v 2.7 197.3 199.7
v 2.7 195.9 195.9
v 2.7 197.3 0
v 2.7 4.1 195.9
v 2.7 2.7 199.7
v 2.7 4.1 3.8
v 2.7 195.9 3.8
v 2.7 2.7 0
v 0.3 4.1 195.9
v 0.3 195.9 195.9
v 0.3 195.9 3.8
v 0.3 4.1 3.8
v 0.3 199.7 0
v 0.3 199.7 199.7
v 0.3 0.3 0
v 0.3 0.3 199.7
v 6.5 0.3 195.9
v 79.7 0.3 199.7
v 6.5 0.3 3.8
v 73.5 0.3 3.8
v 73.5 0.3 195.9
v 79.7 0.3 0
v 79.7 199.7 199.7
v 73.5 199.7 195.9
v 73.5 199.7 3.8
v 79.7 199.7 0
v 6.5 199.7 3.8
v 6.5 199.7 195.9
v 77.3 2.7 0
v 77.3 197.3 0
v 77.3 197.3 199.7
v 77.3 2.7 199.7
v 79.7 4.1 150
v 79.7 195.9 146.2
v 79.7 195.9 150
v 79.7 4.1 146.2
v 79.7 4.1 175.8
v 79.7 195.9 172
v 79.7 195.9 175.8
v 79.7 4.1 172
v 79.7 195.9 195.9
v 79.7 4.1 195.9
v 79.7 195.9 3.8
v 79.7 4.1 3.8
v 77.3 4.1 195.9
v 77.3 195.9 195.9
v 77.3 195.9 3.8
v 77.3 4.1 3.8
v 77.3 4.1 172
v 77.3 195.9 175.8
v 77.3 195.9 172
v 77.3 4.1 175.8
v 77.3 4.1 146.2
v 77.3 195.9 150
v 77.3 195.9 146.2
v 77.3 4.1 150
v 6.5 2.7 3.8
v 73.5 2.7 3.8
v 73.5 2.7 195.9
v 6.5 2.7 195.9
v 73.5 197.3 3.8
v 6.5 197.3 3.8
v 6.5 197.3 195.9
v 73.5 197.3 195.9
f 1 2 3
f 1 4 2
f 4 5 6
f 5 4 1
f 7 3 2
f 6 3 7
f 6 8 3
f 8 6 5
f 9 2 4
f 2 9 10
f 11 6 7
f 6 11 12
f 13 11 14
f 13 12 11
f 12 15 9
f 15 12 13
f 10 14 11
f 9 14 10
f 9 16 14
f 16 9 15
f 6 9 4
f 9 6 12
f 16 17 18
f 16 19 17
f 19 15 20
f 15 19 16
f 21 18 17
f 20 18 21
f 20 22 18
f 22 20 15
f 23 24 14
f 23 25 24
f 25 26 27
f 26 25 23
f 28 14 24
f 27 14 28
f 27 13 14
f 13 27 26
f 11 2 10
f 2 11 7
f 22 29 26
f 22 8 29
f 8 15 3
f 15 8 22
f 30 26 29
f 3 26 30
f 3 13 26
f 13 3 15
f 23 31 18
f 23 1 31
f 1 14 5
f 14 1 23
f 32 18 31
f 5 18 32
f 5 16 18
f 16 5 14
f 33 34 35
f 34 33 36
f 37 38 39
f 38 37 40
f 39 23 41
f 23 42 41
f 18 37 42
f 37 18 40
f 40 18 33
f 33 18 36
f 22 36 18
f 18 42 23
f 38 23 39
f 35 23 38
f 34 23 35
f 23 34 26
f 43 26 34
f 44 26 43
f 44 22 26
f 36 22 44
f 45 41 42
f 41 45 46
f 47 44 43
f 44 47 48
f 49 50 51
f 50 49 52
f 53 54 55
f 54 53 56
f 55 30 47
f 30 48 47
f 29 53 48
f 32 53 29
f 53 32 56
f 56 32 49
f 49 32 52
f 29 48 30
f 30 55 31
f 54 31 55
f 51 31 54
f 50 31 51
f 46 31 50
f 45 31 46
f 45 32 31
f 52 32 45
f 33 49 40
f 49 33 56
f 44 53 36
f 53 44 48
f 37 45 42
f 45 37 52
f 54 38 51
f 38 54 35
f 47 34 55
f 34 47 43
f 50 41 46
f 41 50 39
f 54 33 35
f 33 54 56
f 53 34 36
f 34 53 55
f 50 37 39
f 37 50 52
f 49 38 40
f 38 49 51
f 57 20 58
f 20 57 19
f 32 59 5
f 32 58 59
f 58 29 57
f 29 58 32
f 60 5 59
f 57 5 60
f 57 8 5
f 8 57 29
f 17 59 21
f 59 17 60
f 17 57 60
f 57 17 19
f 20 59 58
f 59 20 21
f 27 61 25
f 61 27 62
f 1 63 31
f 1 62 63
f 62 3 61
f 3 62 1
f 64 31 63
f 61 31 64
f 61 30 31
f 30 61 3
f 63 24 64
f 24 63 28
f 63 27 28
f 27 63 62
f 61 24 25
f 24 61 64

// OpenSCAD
//Variablen Menschen
ms = 1.27; //Skalierung des Mannes Größter = 190 cm

boxc_r = .7;
boxc_g = .5;
boxc_b = .5;
boxc_a = 1; //Sichtbarkeit, 1 = voll

//variablen Box
box_h = 200;
box_b = 200; //Breite der Box
box_t = 80; // Tiefe der Box
box_l = 0; //Lift, im Transportbetrieb

box_d = 0.3; //Dicke der Platten in mm


//variablen Geruest

//Farbe
gerc_r = .7;
gerc_g = .8;
gerc_b = .7;
gerc_a = 1; //Sichtbarkeit, 1 = voll


holz_b = 2.4; //Kantholz, 1 = voll
holz_l = 3.8;

//Variablen Monitor

monitor_b = 30;
monitor_h = 22;

monitor_z =150;

//Aufruf


geruest_vorne_hinten();
geruest_seiten();
//box();  //-Schraegstriche entfernen um box zu zeigen
//people_stand(); //-Schraegstriche entfernen um Menschen zu zeigen
//people_walk(); //-Schraegstriche entfernen um Menschen zu zeigen

module people_stand()
{
    difference()
	{
       	union()
        {   
            //Mann 1
            translate([90,0,-4])
            scale([ms,ms,ms])
            rotate([0,0,90])
            import("man_1.stl", convexity=3);
            //Mann 2
            translate([105,60,-4])
            scale([ms,ms,ms])
            rotate([0,0,90])
            import("man_3.stl", convexity=3);
            //Mann 3
            translate([60,60,-4])
            scale([ms,ms,ms])
            rotate([0,0,90])
            import("man_2.stl", convexity=3);
            //Mann 3
            translate([90,120,-4])
            scale([ms,ms,ms])
            rotate([0,0,90])
            import("man_2.stl", convexity=3);
        }
        
         union()
        {
            translate([0,0,-5])
            cube([200, 500, 5]);
        }
    }
}

module people_walk()
{
    difference()
	{
       	union()
        {   
            //Mann 1
            translate([0,0,-4])
            scale([ms,ms,ms])
            rotate([0,0,0])
            import("man_1.stl", convexity=3);
            //Mann 2
            translate([0,60,-4])
            scale([ms,ms,ms])
            rotate([0,0,0])
            import("man_3.stl", convexity=3);
            //Mann 3
            translate([0,120,-4])
            scale([ms,ms,ms])
            rotate([0,0,0])
            import("man_2.stl", convexity=3);
        }
        
         union()
        {
            translate([0,0,-5])
            cube([200, 500, 5]);
        }
    }
}


module geruest_vorne_hinten()
{
    difference()
	{
       	union()
        {
            //Hinterseite Box links hinten
            translate([box_d,box_d, holz_l])
            color([gerc_r, gerc_g, gerc_b, gerc_a])
            cube([holz_b,holz_l,box_h - box_d - holz_l * 2]);
            
            //Hinterseite Box rechts hinten
            translate([box_d,box_b - box_d - holz_l,holz_l])
            color([gerc_r, gerc_g, gerc_b, gerc_a])
            cube([holz_b,holz_l,box_h - box_d - holz_l * 2]);

            //Hinterseite Box unten
            translate([box_d,box_d, 0])
            color([gerc_r, gerc_g / 2, gerc_b, gerc_a])
            cube([holz_b, box_b - box_d * 2, holz_l]);
            
            //Hinterseite Box oben
            translate([box_d,box_d,box_h - box_d - holz_l])
            color([gerc_r, gerc_g / 2, gerc_b, gerc_a])
            cube([holz_b, box_b - box_d * 2, holz_l]);
            
            
            //Vorderseite Box links vorn
            translate([box_t - box_d - holz_b,box_d, holz_l])
            color([gerc_r, gerc_g, gerc_b, gerc_a])
            cube([holz_b,holz_l,box_h - box_d - holz_l * 2]);
            
            //Vorderseite Box rechts vorn
            translate([box_t - box_d - holz_b,box_b - box_d - holz_l, holz_l])
            color([gerc_r, gerc_g, gerc_b, gerc_a])
            cube([holz_b,holz_l,box_h - box_d - holz_l * 2]);
            
            //Vorderseite Box unten
            translate([box_t - box_d - holz_b, box_d, 0])
            color([gerc_r, gerc_g / 2, gerc_b, gerc_a])
            cube([holz_b, box_b - box_d * 2, holz_l]);

            //Vorderseite Box oben
            translate([box_t - box_d - holz_b, box_d ,box_h - box_d - holz_l])
            color([gerc_r, gerc_g / 2, gerc_b, gerc_a])
            cube([holz_b, box_b - box_d * 2, holz_l]);
            
            
            //Monitorstrebe unten
            translate([box_t - box_d - holz_b, box_d + holz_l, monitor_z - holz_l])
            color([gerc_r, gerc_g / 2, gerc_b, gerc_a])
            cube([holz_b, box_b - box_d * 2 - holz_l*2, holz_l]);
            
            //Monitorstrebe oben
            translate([box_t - box_d - holz_b, box_d + holz_l, monitor_z + monitor_h])
            color([gerc_r, gerc_g / 2, gerc_b, gerc_a])
            cube([holz_b, box_b - box_d * 2 - holz_l*2, holz_l]);
            
        }
        
         union()
        {
            //Elemente Minus
        }
    }
}


module geruest_seiten()
{
    difference()
	{
       	union()
        {
            //Linke Seite unten
            translate([box_d + holz_b,box_d,0])
            color([gerc_r/2, gerc_g, gerc_b, gerc_a])
            cube([box_t - box_d*2 - holz_b * 2 ,holz_b, holz_l]);
            
            //Linke Seite oben
            translate([box_d + holz_b,box_d,box_h - holz_l - box_d])
            color([gerc_r/2, gerc_g, gerc_b, gerc_a])
            cube([box_t - box_d*2 - holz_b * 2 ,holz_b, holz_l]);
            
            //linke Seiten hinten
            translate([box_d + holz_b,box_d, holz_l])
            color([gerc_r, gerc_g, gerc_b/2, gerc_a])
            cube([holz_l,holz_b,box_h - box_d - holz_l * 2]);

            //linke Seiten vorn
            translate([box_t - box_d - holz_l - holz_b ,box_d, holz_l])
            color([gerc_r, gerc_g, gerc_b/2, gerc_a])
            cube([holz_l,holz_b,box_h - box_d - holz_l * 2]);
            
            //rechte Seite unten
            translate([box_d + holz_b,box_b - holz_b - box_d,0])
            color([gerc_r/2, gerc_g, gerc_b, gerc_a])
            cube([box_t - box_d*2 - holz_b * 2 ,holz_b, holz_l]);
            
            //rechte Seite oben
            translate([box_d + holz_b,box_b - holz_b - box_d,box_h - holz_l - box_d])
            color([gerc_r/2, gerc_g, gerc_b, gerc_a])
            cube([box_t - box_d*2 - holz_b * 2 ,holz_b, holz_l]);
            
            //rechte Seiten hinten
            translate([box_d + holz_b,box_b - holz_b - box_d, holz_l])
            color([gerc_r, gerc_g / 2, gerc_b / 2, gerc_a])
            cube([holz_l,holz_b,box_h - box_d - holz_l * 2]);
            
            //rechte Seiten vorn
            translate([box_t - box_d - holz_l - holz_b ,box_b - holz_b - box_d, holz_l])
            color([gerc_r, gerc_g, gerc_b/2, gerc_a])
            cube([holz_l,holz_b,box_h - box_d - holz_l * 2]);
            

            
        }
        
         union()
        {
            
        }
    }
}

module box()
{
    difference()
	{
       	union()
        {
            //Platten vorn
            color([boxc_r * .75, boxc_g * .5, boxc_b,boxc_a])
            translate([0,0,box_l])
            cube([box_d,box_b,box_h]);       
       
            //Platten hinten
            color([boxc_r * .75, boxc_g * .5, boxc_b,boxc_a])
            translate([box_t - box_d,0,box_l])
            cube([box_d,box_b,box_h]);  
            
            //Platten rechts
            color([boxc_r, boxc_g, boxc_b, boxc_a])
            translate([box_d,0,box_l])
            cube([box_t - box_d*2,box_d,box_h]);      
    
            //Platten links
            color([boxc_r, boxc_g, boxc_b, boxc_a])
            translate([box_d,box_b-box_d,box_l])
            cube([box_t - box_d*2,box_d,box_h]);       

            //Platten oben
            color([boxc_r * .7, boxc_g * .7, boxc_b * .7, boxc_a])
            translate([box_d,box_d,box_h - box_d])
            cube([box_t - 2 * box_d,box_b - 2 * box_d,box_d]); 


        }
        
         union()
        {
            //Elemente Minus
            translate([box_t - 1, box_b / 2 - monitor_b / 2,  monitor_z])
            cube([box_d + 2, monitor_b,  monitor_h]);
            
        }
    }
}
